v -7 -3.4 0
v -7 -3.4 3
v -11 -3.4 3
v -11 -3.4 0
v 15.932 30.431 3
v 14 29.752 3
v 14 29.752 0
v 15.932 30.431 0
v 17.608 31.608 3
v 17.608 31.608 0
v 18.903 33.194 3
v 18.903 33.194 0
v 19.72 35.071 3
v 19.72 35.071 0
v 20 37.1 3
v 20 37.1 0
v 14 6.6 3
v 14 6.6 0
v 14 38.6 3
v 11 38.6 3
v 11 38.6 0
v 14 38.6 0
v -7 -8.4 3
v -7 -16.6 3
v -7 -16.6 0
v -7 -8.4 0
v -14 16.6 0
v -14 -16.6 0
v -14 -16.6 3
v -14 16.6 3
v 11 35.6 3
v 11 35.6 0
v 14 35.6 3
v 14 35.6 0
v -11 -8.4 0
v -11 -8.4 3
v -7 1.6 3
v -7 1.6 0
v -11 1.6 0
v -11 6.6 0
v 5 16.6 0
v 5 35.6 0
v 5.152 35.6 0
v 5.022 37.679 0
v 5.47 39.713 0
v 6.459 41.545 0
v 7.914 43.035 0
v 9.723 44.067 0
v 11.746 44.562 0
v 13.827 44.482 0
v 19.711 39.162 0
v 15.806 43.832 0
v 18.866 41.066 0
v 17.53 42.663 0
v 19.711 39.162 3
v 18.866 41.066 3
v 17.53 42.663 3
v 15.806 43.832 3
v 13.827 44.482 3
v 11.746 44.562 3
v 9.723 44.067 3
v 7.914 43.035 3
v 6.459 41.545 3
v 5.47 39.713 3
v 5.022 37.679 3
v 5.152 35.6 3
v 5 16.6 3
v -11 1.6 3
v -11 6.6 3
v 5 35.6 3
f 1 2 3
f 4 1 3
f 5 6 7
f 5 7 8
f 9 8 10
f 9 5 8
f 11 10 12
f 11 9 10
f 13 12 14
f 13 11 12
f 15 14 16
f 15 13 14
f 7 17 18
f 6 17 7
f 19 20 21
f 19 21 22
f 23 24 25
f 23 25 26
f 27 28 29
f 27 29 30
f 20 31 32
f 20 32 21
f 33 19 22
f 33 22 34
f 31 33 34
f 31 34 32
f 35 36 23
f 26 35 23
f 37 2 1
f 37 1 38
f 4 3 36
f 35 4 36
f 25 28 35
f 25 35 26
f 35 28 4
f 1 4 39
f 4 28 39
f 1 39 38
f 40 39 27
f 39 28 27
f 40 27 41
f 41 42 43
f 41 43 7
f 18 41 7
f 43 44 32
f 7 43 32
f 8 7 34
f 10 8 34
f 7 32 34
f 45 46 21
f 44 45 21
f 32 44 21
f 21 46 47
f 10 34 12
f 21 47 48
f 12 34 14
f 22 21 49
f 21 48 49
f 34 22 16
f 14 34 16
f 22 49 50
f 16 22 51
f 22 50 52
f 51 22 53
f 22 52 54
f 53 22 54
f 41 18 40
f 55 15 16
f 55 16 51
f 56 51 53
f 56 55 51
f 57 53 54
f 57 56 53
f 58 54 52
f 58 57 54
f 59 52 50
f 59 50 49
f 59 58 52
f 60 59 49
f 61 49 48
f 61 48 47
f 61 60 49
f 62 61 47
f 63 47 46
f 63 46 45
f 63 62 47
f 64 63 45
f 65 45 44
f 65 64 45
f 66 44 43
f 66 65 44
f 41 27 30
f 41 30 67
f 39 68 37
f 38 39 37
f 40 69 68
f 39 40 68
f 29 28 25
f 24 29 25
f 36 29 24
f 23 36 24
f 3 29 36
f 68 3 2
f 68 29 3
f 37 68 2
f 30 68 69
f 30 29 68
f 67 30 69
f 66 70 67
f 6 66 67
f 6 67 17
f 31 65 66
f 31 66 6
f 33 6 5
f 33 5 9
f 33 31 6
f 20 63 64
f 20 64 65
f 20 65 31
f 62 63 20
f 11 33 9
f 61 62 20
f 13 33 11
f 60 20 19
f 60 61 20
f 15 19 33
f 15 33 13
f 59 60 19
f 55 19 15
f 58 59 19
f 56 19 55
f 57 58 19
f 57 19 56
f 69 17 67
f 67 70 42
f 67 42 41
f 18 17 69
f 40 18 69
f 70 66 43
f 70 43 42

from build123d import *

# Parameters (mm, degrees)
SKETCH2_W           = 28
SKETCH2_H           = 33.2
BOSS_EXTRUDE1_DEPTH = 3
SKETCH4_W           = 21
SKETCH4_H           = 5
SKETCH4_H_2         = 8.2
CUT_EXTRUDE1_DEPTH  = 3
BOSS_EXTRUDE2_DEPTH = 3


with BuildPart() as part:
    # Sketch2 → Boss-Extrude1 (new body)
    with BuildSketch(Plane.XY):
        Rectangle(SKETCH2_W, SKETCH2_H)
    extrude(amount=BOSS_EXTRUDE1_DEPTH)

    # Sketch4 → Cut-Extrude1 (cut)
    with BuildSketch(Plane.XY.offset(3)):
        Polygon((14, 1.6), (14, 6.6), (-11, 6.6), (-11, 1.6), (-7, 1.6), align=None)
        with Locations((3.5, -0.9)):
            Rectangle(SKETCH4_W, SKETCH4_H)
        Polygon((14, -8.4), (14, -3.4), (-7, -3.4), (-11, -3.4), (-11, -8.4), (-7, -8.4), align=None)
        with Locations((3.5, -12.5)):
            Rectangle(SKETCH4_W, SKETCH4_H_2)
    extrude(amount=-CUT_EXTRUDE1_DEPTH, mode=Mode.SUBTRACT)

    # Sketch5 → Boss-Extrude2 (add)
    with BuildSketch(Plane.XY.offset(3)):
        with BuildLine():
            Line((11, 29.751530772), (11, 35.6))
            Line((11, 35.6), (5.151530772, 35.6))
            ThreePointArc((5.151530772, 35.6), (7.196699141, 31.796699141), (11, 29.751530772))
        make_face()
        with BuildLine():
            Line((11, 16.6), (11, 29.751530772))
            ThreePointArc((11, 29.751530772), (7.196699141, 31.796699141), (5.151530772, 35.6))
            Line((5.151530772, 35.6), (5, 35.6))
            Line((5, 35.6), (5, 16.6))
            Line((5, 16.6), (11, 16.6))
        make_face()
        with BuildLine():
            Line((14, 16.6), (14, 29.751530772))
            ThreePointArc((14, 29.751530772), (12.5, 29.6), (11, 29.751530772))
            Line((11, 29.751530772), (11, 16.6))
            Line((11, 16.6), (14, 16.6))
        make_face()
        with BuildLine():
            Line((14, 29.751530772), (14, 35.6))
            Line((14, 35.6), (11, 35.6))
            Line((11, 35.6), (11, 29.751530772))
            ThreePointArc((11, 29.751530772), (12.5, 29.6), (14, 29.751530772))
        make_face()
        with BuildLine():
            Line((14, 38.6), (14, 35.6))
            Line((14, 35.6), (14, 29.751530772))
            ThreePointArc((14, 29.751530772), (18.309475019, 32.35658351), (20, 37.1))
            ThreePointArc((20, 37.1), (11.746182785, 44.562021148), (5.151530772, 35.6))
            Line((5.151530772, 35.6), (11, 35.6))
            Line((11, 35.6), (11, 38.6))
            Line((11, 38.6), (14, 38.6))
        make_face()
    extrude(amount=-BOSS_EXTRUDE2_DEPTH)


solid = part.part
